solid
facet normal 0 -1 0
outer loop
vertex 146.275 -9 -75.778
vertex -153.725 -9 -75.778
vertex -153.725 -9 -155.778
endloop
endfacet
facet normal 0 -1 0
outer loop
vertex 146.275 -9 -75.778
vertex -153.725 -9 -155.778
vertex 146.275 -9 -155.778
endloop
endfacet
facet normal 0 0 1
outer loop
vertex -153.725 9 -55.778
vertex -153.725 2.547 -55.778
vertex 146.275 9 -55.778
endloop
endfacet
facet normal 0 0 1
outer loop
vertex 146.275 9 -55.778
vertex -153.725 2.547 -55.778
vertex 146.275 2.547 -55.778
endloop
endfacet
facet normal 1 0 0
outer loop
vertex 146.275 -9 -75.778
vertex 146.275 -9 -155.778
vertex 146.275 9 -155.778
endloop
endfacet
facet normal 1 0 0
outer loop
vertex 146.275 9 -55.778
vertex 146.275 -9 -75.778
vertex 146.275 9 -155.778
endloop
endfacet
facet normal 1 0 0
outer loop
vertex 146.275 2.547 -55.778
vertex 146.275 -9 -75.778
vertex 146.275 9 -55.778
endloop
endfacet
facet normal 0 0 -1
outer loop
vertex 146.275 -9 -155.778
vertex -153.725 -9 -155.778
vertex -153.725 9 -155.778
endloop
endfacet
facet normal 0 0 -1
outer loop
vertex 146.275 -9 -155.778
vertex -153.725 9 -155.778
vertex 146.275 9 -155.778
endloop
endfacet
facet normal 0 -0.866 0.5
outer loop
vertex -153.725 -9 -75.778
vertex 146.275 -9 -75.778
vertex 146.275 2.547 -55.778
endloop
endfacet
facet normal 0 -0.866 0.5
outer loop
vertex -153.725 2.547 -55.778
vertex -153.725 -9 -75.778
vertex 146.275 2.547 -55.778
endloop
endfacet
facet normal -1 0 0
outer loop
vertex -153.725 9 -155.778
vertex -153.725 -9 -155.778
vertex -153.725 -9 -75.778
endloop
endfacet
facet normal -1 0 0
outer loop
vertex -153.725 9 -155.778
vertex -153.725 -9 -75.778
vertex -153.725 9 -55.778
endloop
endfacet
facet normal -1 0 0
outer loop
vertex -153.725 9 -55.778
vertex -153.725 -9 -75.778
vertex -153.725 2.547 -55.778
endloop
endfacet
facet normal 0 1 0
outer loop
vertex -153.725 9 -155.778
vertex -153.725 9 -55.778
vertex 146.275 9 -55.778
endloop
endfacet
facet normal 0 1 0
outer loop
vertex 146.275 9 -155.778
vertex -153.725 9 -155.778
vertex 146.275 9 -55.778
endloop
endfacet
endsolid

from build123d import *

# Parameters (mm, degrees)
F0_W     = 300
F0_H     = 100
F1_DEPTH = 9
F3_DEPTH = 300.001


with BuildPart() as f1:
    # F0 (on Front) → F1 (new body, symmetric)
    with BuildSketch(Plane.XZ):
        with Locations((-3.72486, -105.77762)):
            Rectangle(F0_W, F0_H)
    extrude(amount=F1_DEPTH, both=True)

    # F2 (on face) → F3 (cut, through all)
    with BuildSketch(Plane.YZ.offset(146.27514)):
        Polygon((-9, -55.77762), (-9, -75.77762), (2.547005, -55.77762), align=None)
    extrude(amount=-F3_DEPTH, mode=Mode.SUBTRACT)


solid = f1.part
